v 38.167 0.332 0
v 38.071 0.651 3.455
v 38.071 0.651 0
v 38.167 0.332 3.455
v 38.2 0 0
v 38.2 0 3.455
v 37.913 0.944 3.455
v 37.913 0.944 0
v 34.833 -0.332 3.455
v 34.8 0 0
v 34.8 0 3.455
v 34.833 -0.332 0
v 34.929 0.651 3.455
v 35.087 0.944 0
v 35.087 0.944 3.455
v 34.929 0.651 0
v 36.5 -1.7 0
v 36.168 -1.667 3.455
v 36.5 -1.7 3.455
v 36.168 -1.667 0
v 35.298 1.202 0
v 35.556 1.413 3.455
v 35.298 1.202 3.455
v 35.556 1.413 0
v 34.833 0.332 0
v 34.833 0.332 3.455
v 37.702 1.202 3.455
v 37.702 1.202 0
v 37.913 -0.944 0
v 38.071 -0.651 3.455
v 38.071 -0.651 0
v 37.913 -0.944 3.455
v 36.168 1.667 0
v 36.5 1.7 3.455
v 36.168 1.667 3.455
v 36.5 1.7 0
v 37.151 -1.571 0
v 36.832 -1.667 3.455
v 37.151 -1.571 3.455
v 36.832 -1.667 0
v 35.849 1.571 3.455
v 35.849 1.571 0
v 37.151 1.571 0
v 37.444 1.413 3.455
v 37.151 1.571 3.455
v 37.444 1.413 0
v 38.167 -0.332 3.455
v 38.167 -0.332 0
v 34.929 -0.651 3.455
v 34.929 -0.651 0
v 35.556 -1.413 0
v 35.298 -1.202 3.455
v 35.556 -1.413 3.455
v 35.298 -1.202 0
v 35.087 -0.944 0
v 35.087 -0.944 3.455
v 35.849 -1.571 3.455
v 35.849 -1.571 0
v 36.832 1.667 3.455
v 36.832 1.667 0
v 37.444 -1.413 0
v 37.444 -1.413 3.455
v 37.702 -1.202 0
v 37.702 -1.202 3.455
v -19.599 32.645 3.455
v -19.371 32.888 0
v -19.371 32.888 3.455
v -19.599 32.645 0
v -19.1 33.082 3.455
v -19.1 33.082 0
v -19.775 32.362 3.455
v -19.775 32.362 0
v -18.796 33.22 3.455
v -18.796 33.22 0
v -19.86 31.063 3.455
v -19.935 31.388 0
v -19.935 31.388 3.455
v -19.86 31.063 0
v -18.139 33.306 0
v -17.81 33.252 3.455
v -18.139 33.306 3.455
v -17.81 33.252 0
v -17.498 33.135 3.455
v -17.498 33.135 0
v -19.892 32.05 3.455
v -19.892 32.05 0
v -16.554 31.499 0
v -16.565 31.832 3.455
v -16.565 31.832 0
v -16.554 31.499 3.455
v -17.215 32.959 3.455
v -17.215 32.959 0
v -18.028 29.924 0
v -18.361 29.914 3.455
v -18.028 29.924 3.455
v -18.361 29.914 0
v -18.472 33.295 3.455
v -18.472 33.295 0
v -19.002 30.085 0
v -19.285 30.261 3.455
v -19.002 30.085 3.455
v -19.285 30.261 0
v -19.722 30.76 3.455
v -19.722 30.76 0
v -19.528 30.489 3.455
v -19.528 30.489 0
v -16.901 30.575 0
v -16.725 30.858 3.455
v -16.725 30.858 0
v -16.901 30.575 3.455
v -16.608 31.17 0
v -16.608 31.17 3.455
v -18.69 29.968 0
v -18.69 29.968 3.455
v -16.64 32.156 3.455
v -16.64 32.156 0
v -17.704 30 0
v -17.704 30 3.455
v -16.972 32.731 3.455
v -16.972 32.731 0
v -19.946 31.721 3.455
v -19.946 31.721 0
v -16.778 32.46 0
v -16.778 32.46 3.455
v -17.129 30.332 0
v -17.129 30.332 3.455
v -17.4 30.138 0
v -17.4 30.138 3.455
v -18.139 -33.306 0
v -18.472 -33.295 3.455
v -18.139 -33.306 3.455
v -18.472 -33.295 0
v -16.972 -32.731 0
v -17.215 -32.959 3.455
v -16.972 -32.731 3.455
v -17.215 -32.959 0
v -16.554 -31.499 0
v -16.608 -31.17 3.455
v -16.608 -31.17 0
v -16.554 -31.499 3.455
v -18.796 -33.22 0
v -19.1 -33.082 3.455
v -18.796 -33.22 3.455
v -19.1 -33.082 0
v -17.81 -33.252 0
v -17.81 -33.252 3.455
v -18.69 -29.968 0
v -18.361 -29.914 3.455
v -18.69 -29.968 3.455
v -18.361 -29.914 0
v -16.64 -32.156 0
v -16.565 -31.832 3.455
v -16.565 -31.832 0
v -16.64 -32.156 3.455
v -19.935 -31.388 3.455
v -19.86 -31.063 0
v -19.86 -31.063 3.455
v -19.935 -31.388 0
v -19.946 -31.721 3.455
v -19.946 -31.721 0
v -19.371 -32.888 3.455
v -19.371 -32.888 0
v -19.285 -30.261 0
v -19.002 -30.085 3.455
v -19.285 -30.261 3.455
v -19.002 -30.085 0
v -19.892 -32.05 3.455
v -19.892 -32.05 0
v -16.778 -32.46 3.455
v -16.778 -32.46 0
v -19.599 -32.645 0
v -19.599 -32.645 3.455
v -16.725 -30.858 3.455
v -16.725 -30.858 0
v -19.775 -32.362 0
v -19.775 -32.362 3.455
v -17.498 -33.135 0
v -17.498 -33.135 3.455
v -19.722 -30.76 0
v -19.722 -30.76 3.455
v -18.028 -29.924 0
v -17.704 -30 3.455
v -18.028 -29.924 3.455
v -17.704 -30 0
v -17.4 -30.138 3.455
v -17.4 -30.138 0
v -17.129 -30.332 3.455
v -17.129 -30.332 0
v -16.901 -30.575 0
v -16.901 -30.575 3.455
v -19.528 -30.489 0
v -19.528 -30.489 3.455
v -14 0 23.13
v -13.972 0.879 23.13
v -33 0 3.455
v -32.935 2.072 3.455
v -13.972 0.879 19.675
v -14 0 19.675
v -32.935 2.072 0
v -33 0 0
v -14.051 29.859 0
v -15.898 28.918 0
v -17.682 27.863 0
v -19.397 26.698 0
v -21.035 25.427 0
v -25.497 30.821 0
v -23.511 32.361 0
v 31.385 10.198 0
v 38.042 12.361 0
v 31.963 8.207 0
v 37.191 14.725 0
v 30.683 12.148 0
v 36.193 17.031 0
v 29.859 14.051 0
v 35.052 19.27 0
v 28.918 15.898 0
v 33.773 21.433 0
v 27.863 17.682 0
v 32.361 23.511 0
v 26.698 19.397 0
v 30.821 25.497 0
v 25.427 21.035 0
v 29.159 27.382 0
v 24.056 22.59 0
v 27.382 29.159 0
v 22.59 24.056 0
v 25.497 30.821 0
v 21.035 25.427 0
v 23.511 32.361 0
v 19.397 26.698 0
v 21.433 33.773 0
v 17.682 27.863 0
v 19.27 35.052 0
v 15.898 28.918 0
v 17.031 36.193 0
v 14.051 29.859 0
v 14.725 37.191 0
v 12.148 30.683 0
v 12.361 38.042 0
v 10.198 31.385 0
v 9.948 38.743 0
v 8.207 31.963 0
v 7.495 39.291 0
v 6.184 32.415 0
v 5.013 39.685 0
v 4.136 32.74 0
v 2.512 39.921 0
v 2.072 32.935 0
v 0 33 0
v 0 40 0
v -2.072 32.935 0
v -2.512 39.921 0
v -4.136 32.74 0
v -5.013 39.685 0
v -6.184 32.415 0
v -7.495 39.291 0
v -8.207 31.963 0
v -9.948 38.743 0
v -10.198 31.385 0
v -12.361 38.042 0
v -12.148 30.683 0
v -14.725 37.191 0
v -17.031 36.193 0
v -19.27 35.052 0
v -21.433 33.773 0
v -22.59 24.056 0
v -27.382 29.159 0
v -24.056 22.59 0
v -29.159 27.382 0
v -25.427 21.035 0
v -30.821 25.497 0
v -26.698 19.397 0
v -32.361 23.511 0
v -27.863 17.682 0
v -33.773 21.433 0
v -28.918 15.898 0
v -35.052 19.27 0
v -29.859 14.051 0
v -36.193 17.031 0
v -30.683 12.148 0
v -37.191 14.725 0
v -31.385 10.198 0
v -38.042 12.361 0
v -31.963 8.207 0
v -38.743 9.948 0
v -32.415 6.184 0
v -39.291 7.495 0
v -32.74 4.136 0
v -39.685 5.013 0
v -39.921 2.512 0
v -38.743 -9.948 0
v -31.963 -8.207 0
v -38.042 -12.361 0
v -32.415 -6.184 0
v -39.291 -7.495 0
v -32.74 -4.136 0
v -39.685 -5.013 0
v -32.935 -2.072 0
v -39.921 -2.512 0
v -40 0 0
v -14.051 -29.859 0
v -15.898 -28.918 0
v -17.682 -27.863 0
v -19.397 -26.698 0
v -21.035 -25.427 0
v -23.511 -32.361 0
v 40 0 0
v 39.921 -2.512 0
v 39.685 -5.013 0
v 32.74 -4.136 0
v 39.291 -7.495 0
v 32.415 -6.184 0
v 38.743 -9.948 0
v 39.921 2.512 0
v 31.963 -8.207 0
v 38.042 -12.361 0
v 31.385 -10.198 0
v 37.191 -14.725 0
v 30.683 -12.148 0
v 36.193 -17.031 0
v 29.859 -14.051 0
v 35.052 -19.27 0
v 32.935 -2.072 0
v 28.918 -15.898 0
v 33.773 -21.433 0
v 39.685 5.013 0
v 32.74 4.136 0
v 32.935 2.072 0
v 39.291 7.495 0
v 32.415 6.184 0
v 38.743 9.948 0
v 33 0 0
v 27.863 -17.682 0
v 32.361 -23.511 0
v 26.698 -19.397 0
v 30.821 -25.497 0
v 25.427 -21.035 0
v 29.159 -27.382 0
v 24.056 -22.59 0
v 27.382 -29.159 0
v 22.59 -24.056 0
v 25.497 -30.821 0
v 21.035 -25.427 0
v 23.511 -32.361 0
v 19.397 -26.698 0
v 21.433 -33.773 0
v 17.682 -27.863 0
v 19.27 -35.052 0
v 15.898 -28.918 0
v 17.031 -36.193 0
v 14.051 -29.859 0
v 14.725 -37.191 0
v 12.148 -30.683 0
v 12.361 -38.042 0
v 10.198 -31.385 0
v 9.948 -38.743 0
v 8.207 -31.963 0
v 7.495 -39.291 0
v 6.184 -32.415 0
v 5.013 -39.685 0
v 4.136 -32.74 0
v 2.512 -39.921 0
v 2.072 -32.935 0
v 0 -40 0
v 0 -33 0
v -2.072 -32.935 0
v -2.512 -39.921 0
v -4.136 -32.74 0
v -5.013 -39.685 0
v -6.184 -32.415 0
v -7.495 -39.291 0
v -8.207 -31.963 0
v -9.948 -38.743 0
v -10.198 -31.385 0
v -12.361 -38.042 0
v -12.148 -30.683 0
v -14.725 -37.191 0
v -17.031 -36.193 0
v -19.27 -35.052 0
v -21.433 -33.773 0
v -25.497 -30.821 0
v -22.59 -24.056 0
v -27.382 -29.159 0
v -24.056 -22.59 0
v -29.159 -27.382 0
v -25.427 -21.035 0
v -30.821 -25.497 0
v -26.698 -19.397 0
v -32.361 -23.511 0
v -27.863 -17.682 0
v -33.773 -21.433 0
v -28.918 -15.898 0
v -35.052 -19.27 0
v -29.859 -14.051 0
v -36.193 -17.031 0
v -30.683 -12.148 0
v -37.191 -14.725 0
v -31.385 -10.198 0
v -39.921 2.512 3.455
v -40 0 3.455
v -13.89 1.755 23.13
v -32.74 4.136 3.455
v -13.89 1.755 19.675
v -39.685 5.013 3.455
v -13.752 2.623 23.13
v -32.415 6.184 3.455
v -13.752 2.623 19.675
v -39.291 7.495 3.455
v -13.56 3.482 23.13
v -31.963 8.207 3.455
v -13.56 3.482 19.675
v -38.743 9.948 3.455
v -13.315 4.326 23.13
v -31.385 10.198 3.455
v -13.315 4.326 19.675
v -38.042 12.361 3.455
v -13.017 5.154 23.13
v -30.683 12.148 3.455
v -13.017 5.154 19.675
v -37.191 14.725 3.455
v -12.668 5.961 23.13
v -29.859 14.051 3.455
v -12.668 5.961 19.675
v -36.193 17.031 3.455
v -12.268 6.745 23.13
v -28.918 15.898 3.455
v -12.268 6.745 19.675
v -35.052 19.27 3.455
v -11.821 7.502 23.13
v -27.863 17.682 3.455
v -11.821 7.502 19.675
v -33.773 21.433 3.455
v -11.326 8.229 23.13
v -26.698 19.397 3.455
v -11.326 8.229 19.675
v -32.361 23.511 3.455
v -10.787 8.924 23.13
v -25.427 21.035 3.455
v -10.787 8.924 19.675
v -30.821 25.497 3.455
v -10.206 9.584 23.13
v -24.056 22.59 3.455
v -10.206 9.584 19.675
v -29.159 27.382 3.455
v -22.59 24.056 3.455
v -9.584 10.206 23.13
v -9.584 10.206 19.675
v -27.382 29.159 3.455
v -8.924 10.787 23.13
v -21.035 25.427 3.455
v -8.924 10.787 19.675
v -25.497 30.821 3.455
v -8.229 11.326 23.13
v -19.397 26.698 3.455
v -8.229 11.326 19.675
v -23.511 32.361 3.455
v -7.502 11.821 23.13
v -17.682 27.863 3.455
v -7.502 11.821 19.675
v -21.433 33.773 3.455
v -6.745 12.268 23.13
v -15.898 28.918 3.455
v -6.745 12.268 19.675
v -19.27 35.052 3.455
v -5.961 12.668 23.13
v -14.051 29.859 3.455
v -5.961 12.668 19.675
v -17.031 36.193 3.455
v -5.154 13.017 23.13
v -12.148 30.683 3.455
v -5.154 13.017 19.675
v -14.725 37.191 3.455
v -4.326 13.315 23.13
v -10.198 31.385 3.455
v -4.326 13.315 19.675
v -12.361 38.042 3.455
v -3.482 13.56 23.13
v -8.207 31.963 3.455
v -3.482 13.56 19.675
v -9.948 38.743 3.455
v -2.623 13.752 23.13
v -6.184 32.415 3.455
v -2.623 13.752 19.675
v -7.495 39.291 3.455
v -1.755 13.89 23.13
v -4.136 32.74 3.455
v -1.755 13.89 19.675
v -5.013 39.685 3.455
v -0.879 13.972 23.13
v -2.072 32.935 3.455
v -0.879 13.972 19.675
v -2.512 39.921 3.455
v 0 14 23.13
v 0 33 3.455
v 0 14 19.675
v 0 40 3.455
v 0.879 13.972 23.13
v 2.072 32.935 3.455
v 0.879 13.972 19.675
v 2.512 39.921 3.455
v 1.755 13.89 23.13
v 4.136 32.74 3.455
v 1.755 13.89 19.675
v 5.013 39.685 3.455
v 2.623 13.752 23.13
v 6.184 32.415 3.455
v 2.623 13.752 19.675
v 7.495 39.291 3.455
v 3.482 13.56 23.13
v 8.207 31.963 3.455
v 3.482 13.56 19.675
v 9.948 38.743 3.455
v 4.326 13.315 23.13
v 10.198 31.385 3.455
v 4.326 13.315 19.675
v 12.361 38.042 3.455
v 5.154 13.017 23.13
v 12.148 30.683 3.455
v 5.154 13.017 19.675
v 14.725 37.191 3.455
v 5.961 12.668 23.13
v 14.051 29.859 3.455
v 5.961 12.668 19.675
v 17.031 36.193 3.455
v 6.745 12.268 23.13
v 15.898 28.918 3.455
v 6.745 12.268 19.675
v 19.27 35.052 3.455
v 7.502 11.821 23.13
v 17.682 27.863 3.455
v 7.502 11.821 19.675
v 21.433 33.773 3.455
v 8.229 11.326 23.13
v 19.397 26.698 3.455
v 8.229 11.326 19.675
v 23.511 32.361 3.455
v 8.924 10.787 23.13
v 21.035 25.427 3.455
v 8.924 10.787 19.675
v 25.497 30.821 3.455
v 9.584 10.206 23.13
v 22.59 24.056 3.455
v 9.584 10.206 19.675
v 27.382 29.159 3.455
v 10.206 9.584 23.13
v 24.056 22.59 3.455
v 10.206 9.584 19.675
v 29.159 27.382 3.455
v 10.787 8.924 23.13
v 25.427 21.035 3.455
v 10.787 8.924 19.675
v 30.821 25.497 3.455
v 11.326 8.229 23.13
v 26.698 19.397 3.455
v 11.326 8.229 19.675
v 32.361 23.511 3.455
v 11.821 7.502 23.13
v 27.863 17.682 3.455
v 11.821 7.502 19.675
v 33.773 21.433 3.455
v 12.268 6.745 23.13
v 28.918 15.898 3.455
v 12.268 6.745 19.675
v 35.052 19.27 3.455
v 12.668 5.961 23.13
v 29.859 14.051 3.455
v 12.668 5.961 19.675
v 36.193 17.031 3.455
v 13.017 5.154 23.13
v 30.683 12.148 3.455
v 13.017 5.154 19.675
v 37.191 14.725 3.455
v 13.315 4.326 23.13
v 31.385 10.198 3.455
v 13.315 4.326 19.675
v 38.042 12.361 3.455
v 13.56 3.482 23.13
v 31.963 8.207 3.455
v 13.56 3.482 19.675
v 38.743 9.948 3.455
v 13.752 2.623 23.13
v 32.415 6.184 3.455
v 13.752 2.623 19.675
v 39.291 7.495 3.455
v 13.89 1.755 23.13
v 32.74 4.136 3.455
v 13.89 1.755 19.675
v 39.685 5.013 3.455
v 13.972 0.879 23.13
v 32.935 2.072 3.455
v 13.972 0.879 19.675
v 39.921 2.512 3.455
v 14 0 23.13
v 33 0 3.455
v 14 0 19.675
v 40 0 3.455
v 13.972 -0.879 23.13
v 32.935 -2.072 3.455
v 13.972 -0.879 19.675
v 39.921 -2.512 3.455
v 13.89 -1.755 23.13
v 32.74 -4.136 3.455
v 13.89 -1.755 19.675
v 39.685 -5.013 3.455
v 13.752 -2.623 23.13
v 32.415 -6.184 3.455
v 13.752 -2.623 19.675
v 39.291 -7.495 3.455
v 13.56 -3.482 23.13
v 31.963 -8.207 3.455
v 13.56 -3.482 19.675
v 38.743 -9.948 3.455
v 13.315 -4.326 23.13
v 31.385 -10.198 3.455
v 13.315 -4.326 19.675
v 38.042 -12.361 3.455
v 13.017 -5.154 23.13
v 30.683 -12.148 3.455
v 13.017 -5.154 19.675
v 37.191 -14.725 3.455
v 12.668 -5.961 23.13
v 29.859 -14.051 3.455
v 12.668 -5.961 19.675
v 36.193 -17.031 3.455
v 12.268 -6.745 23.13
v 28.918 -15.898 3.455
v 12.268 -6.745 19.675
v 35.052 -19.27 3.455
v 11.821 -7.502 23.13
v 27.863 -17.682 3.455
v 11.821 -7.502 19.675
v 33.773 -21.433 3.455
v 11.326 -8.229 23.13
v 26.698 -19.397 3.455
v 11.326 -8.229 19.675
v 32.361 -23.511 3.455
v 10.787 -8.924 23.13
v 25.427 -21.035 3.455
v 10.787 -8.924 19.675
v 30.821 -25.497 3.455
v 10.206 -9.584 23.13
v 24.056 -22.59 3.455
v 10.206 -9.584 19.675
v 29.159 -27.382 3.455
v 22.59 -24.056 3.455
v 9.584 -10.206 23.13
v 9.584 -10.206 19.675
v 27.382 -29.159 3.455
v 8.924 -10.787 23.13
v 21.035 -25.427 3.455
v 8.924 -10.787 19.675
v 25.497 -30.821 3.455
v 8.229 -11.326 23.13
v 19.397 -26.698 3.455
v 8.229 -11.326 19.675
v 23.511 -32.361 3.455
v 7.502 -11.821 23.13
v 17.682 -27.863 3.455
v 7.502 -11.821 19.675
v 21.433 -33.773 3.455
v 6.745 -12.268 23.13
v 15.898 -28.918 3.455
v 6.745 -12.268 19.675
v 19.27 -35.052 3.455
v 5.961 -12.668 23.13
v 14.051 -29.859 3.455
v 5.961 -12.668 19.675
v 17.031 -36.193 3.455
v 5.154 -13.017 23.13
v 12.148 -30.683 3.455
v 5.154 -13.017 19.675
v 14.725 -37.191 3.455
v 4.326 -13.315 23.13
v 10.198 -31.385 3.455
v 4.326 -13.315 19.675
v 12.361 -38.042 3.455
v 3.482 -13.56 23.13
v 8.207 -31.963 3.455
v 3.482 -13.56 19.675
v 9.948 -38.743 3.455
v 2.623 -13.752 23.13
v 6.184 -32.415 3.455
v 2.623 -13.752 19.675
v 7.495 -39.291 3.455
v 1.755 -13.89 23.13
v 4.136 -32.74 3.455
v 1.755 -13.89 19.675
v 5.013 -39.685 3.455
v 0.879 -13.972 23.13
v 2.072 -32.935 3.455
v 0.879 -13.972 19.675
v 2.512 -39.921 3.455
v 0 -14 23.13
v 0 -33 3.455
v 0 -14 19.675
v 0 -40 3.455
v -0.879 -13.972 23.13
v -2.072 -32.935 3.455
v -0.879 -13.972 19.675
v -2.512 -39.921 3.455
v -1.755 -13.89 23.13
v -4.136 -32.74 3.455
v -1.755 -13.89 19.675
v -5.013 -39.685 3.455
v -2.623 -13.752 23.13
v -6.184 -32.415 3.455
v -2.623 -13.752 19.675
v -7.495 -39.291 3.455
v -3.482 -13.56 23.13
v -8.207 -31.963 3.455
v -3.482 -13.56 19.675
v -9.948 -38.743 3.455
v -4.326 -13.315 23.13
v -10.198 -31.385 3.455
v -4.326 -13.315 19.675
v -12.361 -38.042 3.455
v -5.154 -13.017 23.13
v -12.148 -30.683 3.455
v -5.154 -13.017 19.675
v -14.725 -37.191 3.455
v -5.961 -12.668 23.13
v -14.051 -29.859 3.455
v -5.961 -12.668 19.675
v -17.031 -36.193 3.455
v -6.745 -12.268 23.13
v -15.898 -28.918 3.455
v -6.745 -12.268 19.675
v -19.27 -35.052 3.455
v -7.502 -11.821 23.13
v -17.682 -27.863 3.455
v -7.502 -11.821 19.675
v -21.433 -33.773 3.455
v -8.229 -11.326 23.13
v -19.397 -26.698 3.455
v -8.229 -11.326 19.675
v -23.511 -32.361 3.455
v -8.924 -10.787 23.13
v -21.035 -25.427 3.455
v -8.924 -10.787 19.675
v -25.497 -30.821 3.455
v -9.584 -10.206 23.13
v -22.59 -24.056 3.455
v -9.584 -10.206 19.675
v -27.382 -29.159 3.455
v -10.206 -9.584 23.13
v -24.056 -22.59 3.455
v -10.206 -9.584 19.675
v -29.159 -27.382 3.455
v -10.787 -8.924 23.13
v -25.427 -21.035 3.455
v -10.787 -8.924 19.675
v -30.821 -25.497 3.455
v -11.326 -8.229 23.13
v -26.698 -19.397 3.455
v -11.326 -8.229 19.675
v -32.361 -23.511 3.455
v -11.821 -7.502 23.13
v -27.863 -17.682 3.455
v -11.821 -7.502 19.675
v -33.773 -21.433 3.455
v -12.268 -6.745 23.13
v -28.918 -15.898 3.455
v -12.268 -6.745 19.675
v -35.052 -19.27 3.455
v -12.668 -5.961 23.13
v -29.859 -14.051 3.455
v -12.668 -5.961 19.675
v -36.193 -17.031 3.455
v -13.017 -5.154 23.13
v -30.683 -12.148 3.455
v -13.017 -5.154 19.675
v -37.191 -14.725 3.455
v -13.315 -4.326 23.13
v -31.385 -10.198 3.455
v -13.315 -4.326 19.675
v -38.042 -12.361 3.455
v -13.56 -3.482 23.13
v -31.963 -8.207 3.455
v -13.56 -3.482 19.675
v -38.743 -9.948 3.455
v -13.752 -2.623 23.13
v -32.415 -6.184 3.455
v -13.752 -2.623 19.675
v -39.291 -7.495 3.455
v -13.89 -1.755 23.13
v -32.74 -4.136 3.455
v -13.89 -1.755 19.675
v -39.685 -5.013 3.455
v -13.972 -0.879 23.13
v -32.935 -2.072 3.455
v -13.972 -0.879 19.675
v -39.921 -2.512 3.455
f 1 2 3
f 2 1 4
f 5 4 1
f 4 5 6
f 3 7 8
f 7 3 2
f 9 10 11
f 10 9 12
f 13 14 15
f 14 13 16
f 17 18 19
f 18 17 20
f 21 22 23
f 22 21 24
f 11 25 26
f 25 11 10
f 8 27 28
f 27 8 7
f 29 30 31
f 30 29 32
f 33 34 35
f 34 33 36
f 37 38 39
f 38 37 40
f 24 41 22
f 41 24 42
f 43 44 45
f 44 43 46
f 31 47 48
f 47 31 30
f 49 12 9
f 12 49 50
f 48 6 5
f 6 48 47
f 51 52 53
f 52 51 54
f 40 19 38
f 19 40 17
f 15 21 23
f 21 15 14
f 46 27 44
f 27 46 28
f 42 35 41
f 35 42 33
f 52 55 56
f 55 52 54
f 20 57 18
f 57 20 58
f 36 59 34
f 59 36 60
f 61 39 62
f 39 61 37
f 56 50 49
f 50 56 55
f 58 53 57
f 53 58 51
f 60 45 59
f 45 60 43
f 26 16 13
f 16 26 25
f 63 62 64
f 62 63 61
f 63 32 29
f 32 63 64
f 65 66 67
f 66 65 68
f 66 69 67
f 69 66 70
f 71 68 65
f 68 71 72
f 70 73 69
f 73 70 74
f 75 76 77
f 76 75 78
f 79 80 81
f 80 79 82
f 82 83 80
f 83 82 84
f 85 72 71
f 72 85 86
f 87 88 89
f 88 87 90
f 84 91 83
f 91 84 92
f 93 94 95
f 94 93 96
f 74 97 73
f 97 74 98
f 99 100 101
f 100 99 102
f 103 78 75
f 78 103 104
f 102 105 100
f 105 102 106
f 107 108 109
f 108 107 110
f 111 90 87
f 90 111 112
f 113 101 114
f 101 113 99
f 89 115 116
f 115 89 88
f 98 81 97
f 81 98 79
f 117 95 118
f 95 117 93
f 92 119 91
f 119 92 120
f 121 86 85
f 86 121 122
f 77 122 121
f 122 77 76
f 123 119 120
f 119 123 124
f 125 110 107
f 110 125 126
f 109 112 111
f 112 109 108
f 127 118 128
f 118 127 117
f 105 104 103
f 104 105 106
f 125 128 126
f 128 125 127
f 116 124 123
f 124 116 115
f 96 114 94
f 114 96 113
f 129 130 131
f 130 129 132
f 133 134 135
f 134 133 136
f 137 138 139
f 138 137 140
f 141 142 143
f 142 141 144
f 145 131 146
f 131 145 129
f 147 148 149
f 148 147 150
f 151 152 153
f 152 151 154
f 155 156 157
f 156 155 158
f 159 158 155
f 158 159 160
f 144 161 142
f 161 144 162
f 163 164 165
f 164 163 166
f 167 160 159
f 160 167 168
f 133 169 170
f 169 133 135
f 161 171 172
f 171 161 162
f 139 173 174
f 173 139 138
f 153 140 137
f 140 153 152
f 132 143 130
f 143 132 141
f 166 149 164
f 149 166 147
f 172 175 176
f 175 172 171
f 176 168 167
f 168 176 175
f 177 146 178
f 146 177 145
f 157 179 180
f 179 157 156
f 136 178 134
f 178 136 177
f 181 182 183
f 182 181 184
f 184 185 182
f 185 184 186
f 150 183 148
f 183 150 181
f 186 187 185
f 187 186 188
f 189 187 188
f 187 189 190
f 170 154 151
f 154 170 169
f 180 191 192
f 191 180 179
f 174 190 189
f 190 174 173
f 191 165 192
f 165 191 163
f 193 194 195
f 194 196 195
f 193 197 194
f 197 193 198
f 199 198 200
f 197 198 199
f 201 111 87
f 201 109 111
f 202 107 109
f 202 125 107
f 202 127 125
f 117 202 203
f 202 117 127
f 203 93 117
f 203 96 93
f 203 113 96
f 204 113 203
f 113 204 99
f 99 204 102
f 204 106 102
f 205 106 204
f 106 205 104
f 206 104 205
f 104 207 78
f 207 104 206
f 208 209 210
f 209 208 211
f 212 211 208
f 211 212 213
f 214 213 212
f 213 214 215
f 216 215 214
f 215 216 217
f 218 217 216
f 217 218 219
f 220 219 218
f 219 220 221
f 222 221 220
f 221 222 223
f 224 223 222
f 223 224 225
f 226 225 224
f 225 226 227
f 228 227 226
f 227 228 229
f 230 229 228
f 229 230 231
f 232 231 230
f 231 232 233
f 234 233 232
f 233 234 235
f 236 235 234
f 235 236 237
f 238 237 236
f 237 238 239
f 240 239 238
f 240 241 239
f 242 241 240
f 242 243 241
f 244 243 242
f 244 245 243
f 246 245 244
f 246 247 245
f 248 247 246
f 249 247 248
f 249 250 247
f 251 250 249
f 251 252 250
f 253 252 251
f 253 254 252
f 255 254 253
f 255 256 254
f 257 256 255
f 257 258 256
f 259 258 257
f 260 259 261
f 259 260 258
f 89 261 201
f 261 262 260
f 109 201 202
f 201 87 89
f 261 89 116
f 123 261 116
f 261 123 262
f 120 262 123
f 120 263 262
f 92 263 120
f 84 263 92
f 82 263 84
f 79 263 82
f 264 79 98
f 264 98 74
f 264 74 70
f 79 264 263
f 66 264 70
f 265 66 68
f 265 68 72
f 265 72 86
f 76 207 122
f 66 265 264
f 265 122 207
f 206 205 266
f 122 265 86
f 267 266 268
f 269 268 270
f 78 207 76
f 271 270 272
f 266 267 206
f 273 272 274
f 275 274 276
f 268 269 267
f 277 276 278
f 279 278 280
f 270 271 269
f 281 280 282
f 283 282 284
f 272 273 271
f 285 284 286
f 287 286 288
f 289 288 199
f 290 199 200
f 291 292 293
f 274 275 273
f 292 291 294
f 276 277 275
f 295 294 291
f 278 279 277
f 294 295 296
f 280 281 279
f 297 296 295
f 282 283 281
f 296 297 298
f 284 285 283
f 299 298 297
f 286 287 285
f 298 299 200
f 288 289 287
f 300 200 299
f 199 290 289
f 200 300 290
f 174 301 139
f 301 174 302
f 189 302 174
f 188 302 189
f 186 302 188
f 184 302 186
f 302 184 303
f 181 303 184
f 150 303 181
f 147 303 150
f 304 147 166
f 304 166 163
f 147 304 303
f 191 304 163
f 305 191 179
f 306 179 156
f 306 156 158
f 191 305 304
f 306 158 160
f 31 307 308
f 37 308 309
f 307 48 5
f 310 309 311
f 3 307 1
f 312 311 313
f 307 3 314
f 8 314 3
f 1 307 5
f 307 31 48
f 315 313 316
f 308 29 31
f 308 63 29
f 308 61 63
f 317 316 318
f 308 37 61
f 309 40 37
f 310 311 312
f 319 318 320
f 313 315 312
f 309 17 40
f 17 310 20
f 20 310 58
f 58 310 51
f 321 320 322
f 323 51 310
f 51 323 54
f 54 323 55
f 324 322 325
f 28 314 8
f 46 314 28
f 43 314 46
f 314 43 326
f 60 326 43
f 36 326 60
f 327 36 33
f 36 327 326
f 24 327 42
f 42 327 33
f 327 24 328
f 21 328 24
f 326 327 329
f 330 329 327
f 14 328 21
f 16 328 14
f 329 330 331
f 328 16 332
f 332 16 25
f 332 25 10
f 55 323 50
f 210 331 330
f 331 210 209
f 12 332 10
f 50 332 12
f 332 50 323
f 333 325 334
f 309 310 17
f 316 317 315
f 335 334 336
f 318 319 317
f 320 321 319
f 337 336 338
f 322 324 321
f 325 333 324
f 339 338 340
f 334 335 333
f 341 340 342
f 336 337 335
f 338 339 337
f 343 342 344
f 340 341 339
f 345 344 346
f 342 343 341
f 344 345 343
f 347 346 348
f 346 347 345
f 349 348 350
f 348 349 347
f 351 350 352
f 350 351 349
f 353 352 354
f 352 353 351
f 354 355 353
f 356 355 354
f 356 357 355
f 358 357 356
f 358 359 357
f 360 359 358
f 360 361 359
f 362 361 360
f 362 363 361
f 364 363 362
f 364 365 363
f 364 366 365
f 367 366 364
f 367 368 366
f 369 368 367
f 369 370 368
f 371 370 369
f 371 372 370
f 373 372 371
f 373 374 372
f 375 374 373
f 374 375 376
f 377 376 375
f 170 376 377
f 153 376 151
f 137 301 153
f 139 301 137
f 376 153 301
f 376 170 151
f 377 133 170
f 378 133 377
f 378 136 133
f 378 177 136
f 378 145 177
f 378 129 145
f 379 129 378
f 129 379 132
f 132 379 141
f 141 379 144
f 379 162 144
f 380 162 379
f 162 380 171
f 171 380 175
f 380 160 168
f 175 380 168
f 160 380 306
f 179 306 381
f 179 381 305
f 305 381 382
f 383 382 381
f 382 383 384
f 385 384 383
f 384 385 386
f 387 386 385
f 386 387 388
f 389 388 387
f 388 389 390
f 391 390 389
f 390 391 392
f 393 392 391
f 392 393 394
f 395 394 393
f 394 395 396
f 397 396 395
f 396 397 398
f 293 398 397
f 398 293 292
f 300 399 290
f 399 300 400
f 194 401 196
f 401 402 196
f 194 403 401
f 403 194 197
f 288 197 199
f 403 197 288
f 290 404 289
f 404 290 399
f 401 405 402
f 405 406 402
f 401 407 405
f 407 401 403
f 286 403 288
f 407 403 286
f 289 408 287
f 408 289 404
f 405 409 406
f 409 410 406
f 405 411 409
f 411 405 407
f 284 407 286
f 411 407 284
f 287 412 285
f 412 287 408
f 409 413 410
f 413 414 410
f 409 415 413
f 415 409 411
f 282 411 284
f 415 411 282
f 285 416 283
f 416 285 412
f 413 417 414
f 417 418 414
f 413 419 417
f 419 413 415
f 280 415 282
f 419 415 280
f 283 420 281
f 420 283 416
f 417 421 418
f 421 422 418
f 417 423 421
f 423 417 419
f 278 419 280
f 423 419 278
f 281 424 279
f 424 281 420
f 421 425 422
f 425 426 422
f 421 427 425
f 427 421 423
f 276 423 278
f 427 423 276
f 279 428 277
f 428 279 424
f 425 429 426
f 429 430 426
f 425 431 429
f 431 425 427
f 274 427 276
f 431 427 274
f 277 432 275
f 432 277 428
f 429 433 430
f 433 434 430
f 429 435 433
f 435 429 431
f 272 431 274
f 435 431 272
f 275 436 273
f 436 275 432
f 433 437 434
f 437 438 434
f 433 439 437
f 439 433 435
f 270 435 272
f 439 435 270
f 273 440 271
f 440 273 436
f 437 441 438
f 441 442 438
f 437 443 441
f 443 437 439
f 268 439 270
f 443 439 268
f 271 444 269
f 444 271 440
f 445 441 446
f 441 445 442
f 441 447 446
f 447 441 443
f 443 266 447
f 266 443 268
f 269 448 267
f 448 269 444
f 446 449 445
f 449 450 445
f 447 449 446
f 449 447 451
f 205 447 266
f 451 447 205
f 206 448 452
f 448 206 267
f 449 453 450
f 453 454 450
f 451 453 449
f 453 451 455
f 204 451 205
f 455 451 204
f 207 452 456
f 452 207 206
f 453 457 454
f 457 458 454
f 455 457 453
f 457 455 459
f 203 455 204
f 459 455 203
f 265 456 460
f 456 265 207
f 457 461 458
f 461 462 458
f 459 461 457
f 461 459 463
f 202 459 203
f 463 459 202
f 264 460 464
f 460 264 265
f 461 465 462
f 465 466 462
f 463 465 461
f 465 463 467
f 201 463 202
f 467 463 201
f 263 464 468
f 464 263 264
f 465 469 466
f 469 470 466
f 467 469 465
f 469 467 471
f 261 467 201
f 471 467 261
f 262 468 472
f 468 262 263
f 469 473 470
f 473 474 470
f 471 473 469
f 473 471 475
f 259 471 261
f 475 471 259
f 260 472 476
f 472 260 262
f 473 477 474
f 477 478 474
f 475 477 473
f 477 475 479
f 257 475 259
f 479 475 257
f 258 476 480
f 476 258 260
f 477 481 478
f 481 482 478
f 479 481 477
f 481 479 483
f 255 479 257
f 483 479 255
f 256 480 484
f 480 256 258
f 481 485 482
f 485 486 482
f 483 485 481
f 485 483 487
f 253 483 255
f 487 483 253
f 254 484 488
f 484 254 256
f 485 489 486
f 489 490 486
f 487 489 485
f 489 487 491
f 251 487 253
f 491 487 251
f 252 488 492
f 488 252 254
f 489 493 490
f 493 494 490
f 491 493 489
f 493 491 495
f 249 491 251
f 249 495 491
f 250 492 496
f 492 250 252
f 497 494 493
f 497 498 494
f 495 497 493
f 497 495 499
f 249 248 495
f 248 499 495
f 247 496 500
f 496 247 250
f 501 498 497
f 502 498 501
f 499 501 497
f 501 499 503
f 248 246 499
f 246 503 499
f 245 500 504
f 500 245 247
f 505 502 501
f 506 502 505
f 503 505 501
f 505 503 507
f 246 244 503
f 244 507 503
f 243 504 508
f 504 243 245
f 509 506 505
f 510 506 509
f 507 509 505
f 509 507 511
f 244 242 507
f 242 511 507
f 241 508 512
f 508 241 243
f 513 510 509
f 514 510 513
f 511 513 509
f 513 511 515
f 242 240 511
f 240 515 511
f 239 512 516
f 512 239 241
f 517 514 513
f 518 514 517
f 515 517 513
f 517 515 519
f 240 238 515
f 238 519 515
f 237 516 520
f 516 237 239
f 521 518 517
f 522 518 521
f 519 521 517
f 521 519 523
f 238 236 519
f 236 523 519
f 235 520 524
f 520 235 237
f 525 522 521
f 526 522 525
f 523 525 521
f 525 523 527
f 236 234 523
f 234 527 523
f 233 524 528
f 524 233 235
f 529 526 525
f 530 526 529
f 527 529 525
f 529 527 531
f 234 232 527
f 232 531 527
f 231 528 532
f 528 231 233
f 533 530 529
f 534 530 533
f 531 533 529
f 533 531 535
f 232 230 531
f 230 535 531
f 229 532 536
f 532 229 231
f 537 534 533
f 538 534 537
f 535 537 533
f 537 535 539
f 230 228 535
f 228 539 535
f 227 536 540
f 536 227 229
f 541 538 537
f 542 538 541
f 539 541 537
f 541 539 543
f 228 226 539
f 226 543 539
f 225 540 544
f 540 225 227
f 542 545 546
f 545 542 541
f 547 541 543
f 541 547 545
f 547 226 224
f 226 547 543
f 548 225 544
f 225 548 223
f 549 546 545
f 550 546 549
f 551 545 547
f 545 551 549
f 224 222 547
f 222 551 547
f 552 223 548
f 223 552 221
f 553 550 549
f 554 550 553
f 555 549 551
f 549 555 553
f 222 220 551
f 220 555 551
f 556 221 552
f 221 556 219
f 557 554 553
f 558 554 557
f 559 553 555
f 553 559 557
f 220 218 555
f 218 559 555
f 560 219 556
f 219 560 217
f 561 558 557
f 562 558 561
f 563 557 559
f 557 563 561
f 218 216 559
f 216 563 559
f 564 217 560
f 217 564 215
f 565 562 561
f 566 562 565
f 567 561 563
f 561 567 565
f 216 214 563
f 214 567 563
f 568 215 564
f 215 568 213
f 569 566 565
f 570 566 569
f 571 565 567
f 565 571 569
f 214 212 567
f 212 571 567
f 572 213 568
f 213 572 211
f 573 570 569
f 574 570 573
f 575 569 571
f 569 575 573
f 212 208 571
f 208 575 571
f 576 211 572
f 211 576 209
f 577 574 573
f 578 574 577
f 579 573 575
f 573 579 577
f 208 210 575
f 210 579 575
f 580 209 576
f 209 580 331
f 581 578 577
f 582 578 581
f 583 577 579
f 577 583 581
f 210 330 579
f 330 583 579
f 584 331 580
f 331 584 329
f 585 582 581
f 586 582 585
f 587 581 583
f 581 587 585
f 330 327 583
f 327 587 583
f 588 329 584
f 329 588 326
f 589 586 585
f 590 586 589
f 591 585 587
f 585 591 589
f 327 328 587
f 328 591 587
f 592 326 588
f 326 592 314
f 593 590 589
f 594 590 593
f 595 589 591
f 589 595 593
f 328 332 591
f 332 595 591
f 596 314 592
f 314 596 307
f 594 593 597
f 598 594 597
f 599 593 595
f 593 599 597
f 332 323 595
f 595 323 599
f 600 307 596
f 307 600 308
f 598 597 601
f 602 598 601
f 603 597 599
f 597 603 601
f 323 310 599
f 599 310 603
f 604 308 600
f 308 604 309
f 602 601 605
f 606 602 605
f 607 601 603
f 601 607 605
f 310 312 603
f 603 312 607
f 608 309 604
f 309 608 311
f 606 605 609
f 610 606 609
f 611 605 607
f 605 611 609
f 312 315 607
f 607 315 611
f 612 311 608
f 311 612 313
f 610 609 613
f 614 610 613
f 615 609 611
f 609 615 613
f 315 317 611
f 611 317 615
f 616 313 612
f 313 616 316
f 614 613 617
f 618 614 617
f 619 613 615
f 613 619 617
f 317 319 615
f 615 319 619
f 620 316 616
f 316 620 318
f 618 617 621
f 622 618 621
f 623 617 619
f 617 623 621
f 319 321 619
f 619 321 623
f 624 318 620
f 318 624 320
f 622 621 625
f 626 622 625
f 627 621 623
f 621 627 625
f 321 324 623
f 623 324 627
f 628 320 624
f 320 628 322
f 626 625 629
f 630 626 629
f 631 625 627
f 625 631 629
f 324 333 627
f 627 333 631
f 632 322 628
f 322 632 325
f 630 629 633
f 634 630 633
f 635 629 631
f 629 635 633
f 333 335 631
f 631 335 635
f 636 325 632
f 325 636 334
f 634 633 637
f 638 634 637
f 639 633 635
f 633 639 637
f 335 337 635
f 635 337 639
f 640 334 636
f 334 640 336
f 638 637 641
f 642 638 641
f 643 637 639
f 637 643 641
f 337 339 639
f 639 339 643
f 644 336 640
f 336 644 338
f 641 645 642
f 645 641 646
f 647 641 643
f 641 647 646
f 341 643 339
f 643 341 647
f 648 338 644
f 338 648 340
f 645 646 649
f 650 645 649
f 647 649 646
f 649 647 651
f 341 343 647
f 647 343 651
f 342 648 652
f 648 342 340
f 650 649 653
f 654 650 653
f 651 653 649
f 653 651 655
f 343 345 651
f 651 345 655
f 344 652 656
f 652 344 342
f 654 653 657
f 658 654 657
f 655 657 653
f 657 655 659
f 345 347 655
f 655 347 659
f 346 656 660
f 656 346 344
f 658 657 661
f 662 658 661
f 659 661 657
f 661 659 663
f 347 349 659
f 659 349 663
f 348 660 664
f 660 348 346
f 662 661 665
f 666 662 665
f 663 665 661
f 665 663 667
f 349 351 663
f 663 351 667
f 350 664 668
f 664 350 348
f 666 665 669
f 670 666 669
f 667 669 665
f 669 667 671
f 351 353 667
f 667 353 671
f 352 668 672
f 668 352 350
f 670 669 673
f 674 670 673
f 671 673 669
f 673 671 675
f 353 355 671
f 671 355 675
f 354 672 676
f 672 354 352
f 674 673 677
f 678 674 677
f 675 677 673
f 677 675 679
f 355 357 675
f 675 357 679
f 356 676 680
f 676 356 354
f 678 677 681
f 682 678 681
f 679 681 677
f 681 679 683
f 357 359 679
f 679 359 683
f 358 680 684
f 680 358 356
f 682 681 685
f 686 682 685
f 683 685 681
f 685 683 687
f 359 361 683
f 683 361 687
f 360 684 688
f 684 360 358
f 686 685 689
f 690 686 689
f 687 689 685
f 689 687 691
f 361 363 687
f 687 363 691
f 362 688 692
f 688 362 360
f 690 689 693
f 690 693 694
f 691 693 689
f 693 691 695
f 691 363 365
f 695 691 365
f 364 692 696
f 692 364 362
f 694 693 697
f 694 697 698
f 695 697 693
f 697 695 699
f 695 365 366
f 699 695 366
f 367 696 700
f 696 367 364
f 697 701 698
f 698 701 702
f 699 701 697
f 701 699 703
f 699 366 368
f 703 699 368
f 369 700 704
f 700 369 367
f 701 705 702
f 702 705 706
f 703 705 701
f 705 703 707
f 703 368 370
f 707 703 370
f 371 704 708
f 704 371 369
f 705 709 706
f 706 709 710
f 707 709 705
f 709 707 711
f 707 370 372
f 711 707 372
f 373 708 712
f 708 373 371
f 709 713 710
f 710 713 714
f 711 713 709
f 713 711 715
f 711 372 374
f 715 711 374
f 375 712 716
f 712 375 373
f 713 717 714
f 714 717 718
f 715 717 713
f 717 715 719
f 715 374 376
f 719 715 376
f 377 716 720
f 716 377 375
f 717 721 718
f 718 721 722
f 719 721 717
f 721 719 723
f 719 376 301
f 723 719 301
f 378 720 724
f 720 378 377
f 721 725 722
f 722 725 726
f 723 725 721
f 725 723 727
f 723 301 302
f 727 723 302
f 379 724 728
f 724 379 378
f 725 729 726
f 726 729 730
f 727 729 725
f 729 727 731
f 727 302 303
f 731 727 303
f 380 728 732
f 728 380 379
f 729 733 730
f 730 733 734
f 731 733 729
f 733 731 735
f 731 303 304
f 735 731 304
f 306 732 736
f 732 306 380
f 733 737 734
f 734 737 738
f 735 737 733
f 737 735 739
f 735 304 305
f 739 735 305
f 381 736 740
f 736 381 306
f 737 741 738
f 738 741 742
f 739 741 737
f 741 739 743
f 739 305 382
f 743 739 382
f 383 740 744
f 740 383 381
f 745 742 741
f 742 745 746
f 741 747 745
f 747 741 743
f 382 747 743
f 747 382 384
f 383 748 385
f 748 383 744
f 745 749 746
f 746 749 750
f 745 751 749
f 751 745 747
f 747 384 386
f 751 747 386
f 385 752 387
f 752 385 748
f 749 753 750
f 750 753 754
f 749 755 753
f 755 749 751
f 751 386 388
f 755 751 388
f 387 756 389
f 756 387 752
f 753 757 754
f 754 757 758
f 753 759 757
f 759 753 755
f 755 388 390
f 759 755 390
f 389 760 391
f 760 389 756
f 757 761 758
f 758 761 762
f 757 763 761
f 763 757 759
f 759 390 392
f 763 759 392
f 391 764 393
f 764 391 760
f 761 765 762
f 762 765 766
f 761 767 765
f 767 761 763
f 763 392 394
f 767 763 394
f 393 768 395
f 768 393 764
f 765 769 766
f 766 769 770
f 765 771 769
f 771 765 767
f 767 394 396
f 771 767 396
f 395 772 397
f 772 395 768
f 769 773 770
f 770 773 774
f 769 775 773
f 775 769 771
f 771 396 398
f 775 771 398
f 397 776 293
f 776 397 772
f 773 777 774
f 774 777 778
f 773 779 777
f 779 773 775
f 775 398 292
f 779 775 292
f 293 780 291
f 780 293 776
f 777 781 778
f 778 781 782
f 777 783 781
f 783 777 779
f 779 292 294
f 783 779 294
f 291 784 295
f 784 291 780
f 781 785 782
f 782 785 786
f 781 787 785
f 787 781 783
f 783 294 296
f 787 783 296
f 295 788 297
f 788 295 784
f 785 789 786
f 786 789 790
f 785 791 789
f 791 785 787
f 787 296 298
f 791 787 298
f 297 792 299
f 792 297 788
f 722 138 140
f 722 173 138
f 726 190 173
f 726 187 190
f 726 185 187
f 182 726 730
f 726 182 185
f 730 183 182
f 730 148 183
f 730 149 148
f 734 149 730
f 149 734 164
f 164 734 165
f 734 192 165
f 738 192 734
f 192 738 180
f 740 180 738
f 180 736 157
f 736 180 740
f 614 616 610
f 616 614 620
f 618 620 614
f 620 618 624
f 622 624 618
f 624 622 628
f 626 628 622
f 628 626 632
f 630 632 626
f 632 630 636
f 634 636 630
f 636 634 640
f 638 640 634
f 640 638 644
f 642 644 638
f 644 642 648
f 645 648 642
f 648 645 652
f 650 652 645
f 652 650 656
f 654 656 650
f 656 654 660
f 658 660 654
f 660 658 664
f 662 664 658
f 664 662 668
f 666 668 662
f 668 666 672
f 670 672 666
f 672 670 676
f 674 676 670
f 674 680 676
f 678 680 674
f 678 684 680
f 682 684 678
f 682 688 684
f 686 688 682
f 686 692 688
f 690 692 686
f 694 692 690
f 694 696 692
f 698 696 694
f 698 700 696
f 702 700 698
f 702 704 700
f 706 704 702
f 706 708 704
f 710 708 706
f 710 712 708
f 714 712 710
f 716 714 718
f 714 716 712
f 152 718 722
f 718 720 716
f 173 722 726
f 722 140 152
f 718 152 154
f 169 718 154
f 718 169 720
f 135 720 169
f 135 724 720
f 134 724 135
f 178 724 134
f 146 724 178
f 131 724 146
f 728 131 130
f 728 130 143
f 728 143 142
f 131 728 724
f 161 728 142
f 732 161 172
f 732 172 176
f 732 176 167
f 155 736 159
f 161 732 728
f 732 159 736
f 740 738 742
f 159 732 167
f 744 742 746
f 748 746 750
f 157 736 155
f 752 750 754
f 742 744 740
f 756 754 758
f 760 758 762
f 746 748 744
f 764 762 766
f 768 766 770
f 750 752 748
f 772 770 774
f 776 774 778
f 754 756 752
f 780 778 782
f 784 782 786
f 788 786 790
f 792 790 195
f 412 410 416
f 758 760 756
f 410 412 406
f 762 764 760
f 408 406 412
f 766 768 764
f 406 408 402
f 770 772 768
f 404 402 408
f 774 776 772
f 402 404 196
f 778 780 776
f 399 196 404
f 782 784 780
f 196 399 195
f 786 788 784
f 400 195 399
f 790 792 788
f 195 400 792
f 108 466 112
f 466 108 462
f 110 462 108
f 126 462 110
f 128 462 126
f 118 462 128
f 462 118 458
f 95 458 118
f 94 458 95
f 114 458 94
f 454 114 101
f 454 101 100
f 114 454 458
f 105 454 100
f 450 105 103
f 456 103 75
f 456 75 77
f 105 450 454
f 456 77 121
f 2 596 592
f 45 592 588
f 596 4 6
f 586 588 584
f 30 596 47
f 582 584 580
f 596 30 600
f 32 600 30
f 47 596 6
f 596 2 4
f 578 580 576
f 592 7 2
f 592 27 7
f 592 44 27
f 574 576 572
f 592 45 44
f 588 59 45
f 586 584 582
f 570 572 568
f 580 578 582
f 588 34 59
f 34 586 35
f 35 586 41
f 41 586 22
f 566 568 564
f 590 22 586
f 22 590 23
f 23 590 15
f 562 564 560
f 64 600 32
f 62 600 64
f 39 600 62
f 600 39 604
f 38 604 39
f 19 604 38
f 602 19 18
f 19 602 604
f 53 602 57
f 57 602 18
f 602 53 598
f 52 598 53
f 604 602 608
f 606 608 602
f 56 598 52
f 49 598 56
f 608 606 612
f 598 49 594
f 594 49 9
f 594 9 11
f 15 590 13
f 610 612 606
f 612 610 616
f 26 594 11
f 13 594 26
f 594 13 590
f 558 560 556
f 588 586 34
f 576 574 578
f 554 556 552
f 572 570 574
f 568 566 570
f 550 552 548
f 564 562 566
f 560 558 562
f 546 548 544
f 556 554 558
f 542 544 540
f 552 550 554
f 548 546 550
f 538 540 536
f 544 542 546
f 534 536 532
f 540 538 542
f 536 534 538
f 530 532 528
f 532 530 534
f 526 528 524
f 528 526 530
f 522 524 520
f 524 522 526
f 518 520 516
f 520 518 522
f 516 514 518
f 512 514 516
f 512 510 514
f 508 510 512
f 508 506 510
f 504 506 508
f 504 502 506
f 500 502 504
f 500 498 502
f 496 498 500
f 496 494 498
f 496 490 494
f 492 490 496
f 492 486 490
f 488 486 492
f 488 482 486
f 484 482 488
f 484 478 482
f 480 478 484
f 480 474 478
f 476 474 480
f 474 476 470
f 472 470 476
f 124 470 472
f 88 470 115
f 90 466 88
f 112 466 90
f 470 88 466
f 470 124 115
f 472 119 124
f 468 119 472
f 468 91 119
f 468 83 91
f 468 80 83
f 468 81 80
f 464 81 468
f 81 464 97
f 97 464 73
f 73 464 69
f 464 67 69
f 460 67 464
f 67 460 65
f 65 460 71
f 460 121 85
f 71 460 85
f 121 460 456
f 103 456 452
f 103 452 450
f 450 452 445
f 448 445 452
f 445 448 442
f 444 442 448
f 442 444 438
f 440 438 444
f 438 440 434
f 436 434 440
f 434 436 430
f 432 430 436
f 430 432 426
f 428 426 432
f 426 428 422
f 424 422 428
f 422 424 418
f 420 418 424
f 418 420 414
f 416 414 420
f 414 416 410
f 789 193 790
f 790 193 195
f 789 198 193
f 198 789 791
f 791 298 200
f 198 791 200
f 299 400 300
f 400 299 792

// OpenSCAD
// Compact passive radiation shield for I2C breakout boards (BME280, BMP280, SHT31, SHT4x, AHT20) - original design (Brian Sacco)
// 3 louver plates + cap on three M3 threaded rods. Every part prints as oriented, no supports (cones 44 deg from vertical).
part   = "plate";   // "plate", "cap", "spacers", "base_s", "base_m"
rim_r  = 40;        // OD 80 mm
flat   = 7;
cone_a = 46;        // cone angle from horizontal (44 deg from vertical: self-supporting)
t      = 2.4;
r_in   = 14;        // chimney radius (28 mm hole)
rod_d  = 3.4;       // M3 clearance
pitch  = 10;
base_t = 4;
$fn = 100;

rod_r = rim_r - flat / 2;
tv    = t / cos(cone_a);
sl    = tan(cone_a);
r0    = rim_r - flat;
spacer_len = pitch - tv;

module rods(h) { for (a = [0, 120, 240]) rotate(a) translate([rod_r, 0, -1]) cylinder(d = rod_d, h = h + 2, $fn = 32); }

module plate() {
    difference() {
        rotate_extrude() polygon([[rim_r, 0], [r0, 0], [r_in, (r0 - r_in) * sl], [r_in, (r0 - r_in) * sl + tv], [r0, tv], [rim_r, tv]]);
        rods(tv);
    }
}
module cap() {
    difference() {
        rotate_extrude() polygon([[rim_r, 0], [r0, 0], [0, r0 * sl], [0, r0 * sl + tv], [r0, tv], [rim_r, tv]]);
        rods(tv);
    }
}
module spacers() {   // 12 sleeves (3 rods x 4 gaps)
    for (i = [0 : 3], j = [0 : 2]) translate([i * 9, j * 9, 0]) difference() {
        cylinder(d = 7, h = spacer_len, $fn = 48);
        translate([0, 0, -1]) cylinder(d = rod_d, h = spacer_len + 2, $fn = 32);
    }
}
// board pocket w x l (+clearance), two zip-tie slots, cable slot through the floor
module base(w, l) {
    difference() {
        union() {
            cylinder(r = rim_r, h = base_t);
            translate([-(w + 8) / 2, -(l + 8) / 2, 0]) cube([w + 8, l + 8, 9]);
        }
        rods(base_t);
        translate([-w / 2, -l / 2, 2]) cube([w, l, 10]);                    // board pocket (floor 2 mm)
        translate([-4, l / 2 - 5, -1]) cube([8, 6, 12]);                     // cable slot, open to the top (no bridge)
        for (s = [-1, 1]) translate([s * (w / 2 + 2.4) - 1.2, -3, -1]) cube([2.4, 6, 12]); // zip-tie slits (2.4 wide)
    }
}
if (part == "plate") plate();
else if (part == "cap") cap();
else if (part == "spacers") spacers();
else if (part == "base_s") base(13.5, 18);    // GY-BME280 / BMP280 / AHT20 class boards
else if (part == "base_m") base(18.5, 26);    // Adafruit-size SHT31 / BME280 boards
